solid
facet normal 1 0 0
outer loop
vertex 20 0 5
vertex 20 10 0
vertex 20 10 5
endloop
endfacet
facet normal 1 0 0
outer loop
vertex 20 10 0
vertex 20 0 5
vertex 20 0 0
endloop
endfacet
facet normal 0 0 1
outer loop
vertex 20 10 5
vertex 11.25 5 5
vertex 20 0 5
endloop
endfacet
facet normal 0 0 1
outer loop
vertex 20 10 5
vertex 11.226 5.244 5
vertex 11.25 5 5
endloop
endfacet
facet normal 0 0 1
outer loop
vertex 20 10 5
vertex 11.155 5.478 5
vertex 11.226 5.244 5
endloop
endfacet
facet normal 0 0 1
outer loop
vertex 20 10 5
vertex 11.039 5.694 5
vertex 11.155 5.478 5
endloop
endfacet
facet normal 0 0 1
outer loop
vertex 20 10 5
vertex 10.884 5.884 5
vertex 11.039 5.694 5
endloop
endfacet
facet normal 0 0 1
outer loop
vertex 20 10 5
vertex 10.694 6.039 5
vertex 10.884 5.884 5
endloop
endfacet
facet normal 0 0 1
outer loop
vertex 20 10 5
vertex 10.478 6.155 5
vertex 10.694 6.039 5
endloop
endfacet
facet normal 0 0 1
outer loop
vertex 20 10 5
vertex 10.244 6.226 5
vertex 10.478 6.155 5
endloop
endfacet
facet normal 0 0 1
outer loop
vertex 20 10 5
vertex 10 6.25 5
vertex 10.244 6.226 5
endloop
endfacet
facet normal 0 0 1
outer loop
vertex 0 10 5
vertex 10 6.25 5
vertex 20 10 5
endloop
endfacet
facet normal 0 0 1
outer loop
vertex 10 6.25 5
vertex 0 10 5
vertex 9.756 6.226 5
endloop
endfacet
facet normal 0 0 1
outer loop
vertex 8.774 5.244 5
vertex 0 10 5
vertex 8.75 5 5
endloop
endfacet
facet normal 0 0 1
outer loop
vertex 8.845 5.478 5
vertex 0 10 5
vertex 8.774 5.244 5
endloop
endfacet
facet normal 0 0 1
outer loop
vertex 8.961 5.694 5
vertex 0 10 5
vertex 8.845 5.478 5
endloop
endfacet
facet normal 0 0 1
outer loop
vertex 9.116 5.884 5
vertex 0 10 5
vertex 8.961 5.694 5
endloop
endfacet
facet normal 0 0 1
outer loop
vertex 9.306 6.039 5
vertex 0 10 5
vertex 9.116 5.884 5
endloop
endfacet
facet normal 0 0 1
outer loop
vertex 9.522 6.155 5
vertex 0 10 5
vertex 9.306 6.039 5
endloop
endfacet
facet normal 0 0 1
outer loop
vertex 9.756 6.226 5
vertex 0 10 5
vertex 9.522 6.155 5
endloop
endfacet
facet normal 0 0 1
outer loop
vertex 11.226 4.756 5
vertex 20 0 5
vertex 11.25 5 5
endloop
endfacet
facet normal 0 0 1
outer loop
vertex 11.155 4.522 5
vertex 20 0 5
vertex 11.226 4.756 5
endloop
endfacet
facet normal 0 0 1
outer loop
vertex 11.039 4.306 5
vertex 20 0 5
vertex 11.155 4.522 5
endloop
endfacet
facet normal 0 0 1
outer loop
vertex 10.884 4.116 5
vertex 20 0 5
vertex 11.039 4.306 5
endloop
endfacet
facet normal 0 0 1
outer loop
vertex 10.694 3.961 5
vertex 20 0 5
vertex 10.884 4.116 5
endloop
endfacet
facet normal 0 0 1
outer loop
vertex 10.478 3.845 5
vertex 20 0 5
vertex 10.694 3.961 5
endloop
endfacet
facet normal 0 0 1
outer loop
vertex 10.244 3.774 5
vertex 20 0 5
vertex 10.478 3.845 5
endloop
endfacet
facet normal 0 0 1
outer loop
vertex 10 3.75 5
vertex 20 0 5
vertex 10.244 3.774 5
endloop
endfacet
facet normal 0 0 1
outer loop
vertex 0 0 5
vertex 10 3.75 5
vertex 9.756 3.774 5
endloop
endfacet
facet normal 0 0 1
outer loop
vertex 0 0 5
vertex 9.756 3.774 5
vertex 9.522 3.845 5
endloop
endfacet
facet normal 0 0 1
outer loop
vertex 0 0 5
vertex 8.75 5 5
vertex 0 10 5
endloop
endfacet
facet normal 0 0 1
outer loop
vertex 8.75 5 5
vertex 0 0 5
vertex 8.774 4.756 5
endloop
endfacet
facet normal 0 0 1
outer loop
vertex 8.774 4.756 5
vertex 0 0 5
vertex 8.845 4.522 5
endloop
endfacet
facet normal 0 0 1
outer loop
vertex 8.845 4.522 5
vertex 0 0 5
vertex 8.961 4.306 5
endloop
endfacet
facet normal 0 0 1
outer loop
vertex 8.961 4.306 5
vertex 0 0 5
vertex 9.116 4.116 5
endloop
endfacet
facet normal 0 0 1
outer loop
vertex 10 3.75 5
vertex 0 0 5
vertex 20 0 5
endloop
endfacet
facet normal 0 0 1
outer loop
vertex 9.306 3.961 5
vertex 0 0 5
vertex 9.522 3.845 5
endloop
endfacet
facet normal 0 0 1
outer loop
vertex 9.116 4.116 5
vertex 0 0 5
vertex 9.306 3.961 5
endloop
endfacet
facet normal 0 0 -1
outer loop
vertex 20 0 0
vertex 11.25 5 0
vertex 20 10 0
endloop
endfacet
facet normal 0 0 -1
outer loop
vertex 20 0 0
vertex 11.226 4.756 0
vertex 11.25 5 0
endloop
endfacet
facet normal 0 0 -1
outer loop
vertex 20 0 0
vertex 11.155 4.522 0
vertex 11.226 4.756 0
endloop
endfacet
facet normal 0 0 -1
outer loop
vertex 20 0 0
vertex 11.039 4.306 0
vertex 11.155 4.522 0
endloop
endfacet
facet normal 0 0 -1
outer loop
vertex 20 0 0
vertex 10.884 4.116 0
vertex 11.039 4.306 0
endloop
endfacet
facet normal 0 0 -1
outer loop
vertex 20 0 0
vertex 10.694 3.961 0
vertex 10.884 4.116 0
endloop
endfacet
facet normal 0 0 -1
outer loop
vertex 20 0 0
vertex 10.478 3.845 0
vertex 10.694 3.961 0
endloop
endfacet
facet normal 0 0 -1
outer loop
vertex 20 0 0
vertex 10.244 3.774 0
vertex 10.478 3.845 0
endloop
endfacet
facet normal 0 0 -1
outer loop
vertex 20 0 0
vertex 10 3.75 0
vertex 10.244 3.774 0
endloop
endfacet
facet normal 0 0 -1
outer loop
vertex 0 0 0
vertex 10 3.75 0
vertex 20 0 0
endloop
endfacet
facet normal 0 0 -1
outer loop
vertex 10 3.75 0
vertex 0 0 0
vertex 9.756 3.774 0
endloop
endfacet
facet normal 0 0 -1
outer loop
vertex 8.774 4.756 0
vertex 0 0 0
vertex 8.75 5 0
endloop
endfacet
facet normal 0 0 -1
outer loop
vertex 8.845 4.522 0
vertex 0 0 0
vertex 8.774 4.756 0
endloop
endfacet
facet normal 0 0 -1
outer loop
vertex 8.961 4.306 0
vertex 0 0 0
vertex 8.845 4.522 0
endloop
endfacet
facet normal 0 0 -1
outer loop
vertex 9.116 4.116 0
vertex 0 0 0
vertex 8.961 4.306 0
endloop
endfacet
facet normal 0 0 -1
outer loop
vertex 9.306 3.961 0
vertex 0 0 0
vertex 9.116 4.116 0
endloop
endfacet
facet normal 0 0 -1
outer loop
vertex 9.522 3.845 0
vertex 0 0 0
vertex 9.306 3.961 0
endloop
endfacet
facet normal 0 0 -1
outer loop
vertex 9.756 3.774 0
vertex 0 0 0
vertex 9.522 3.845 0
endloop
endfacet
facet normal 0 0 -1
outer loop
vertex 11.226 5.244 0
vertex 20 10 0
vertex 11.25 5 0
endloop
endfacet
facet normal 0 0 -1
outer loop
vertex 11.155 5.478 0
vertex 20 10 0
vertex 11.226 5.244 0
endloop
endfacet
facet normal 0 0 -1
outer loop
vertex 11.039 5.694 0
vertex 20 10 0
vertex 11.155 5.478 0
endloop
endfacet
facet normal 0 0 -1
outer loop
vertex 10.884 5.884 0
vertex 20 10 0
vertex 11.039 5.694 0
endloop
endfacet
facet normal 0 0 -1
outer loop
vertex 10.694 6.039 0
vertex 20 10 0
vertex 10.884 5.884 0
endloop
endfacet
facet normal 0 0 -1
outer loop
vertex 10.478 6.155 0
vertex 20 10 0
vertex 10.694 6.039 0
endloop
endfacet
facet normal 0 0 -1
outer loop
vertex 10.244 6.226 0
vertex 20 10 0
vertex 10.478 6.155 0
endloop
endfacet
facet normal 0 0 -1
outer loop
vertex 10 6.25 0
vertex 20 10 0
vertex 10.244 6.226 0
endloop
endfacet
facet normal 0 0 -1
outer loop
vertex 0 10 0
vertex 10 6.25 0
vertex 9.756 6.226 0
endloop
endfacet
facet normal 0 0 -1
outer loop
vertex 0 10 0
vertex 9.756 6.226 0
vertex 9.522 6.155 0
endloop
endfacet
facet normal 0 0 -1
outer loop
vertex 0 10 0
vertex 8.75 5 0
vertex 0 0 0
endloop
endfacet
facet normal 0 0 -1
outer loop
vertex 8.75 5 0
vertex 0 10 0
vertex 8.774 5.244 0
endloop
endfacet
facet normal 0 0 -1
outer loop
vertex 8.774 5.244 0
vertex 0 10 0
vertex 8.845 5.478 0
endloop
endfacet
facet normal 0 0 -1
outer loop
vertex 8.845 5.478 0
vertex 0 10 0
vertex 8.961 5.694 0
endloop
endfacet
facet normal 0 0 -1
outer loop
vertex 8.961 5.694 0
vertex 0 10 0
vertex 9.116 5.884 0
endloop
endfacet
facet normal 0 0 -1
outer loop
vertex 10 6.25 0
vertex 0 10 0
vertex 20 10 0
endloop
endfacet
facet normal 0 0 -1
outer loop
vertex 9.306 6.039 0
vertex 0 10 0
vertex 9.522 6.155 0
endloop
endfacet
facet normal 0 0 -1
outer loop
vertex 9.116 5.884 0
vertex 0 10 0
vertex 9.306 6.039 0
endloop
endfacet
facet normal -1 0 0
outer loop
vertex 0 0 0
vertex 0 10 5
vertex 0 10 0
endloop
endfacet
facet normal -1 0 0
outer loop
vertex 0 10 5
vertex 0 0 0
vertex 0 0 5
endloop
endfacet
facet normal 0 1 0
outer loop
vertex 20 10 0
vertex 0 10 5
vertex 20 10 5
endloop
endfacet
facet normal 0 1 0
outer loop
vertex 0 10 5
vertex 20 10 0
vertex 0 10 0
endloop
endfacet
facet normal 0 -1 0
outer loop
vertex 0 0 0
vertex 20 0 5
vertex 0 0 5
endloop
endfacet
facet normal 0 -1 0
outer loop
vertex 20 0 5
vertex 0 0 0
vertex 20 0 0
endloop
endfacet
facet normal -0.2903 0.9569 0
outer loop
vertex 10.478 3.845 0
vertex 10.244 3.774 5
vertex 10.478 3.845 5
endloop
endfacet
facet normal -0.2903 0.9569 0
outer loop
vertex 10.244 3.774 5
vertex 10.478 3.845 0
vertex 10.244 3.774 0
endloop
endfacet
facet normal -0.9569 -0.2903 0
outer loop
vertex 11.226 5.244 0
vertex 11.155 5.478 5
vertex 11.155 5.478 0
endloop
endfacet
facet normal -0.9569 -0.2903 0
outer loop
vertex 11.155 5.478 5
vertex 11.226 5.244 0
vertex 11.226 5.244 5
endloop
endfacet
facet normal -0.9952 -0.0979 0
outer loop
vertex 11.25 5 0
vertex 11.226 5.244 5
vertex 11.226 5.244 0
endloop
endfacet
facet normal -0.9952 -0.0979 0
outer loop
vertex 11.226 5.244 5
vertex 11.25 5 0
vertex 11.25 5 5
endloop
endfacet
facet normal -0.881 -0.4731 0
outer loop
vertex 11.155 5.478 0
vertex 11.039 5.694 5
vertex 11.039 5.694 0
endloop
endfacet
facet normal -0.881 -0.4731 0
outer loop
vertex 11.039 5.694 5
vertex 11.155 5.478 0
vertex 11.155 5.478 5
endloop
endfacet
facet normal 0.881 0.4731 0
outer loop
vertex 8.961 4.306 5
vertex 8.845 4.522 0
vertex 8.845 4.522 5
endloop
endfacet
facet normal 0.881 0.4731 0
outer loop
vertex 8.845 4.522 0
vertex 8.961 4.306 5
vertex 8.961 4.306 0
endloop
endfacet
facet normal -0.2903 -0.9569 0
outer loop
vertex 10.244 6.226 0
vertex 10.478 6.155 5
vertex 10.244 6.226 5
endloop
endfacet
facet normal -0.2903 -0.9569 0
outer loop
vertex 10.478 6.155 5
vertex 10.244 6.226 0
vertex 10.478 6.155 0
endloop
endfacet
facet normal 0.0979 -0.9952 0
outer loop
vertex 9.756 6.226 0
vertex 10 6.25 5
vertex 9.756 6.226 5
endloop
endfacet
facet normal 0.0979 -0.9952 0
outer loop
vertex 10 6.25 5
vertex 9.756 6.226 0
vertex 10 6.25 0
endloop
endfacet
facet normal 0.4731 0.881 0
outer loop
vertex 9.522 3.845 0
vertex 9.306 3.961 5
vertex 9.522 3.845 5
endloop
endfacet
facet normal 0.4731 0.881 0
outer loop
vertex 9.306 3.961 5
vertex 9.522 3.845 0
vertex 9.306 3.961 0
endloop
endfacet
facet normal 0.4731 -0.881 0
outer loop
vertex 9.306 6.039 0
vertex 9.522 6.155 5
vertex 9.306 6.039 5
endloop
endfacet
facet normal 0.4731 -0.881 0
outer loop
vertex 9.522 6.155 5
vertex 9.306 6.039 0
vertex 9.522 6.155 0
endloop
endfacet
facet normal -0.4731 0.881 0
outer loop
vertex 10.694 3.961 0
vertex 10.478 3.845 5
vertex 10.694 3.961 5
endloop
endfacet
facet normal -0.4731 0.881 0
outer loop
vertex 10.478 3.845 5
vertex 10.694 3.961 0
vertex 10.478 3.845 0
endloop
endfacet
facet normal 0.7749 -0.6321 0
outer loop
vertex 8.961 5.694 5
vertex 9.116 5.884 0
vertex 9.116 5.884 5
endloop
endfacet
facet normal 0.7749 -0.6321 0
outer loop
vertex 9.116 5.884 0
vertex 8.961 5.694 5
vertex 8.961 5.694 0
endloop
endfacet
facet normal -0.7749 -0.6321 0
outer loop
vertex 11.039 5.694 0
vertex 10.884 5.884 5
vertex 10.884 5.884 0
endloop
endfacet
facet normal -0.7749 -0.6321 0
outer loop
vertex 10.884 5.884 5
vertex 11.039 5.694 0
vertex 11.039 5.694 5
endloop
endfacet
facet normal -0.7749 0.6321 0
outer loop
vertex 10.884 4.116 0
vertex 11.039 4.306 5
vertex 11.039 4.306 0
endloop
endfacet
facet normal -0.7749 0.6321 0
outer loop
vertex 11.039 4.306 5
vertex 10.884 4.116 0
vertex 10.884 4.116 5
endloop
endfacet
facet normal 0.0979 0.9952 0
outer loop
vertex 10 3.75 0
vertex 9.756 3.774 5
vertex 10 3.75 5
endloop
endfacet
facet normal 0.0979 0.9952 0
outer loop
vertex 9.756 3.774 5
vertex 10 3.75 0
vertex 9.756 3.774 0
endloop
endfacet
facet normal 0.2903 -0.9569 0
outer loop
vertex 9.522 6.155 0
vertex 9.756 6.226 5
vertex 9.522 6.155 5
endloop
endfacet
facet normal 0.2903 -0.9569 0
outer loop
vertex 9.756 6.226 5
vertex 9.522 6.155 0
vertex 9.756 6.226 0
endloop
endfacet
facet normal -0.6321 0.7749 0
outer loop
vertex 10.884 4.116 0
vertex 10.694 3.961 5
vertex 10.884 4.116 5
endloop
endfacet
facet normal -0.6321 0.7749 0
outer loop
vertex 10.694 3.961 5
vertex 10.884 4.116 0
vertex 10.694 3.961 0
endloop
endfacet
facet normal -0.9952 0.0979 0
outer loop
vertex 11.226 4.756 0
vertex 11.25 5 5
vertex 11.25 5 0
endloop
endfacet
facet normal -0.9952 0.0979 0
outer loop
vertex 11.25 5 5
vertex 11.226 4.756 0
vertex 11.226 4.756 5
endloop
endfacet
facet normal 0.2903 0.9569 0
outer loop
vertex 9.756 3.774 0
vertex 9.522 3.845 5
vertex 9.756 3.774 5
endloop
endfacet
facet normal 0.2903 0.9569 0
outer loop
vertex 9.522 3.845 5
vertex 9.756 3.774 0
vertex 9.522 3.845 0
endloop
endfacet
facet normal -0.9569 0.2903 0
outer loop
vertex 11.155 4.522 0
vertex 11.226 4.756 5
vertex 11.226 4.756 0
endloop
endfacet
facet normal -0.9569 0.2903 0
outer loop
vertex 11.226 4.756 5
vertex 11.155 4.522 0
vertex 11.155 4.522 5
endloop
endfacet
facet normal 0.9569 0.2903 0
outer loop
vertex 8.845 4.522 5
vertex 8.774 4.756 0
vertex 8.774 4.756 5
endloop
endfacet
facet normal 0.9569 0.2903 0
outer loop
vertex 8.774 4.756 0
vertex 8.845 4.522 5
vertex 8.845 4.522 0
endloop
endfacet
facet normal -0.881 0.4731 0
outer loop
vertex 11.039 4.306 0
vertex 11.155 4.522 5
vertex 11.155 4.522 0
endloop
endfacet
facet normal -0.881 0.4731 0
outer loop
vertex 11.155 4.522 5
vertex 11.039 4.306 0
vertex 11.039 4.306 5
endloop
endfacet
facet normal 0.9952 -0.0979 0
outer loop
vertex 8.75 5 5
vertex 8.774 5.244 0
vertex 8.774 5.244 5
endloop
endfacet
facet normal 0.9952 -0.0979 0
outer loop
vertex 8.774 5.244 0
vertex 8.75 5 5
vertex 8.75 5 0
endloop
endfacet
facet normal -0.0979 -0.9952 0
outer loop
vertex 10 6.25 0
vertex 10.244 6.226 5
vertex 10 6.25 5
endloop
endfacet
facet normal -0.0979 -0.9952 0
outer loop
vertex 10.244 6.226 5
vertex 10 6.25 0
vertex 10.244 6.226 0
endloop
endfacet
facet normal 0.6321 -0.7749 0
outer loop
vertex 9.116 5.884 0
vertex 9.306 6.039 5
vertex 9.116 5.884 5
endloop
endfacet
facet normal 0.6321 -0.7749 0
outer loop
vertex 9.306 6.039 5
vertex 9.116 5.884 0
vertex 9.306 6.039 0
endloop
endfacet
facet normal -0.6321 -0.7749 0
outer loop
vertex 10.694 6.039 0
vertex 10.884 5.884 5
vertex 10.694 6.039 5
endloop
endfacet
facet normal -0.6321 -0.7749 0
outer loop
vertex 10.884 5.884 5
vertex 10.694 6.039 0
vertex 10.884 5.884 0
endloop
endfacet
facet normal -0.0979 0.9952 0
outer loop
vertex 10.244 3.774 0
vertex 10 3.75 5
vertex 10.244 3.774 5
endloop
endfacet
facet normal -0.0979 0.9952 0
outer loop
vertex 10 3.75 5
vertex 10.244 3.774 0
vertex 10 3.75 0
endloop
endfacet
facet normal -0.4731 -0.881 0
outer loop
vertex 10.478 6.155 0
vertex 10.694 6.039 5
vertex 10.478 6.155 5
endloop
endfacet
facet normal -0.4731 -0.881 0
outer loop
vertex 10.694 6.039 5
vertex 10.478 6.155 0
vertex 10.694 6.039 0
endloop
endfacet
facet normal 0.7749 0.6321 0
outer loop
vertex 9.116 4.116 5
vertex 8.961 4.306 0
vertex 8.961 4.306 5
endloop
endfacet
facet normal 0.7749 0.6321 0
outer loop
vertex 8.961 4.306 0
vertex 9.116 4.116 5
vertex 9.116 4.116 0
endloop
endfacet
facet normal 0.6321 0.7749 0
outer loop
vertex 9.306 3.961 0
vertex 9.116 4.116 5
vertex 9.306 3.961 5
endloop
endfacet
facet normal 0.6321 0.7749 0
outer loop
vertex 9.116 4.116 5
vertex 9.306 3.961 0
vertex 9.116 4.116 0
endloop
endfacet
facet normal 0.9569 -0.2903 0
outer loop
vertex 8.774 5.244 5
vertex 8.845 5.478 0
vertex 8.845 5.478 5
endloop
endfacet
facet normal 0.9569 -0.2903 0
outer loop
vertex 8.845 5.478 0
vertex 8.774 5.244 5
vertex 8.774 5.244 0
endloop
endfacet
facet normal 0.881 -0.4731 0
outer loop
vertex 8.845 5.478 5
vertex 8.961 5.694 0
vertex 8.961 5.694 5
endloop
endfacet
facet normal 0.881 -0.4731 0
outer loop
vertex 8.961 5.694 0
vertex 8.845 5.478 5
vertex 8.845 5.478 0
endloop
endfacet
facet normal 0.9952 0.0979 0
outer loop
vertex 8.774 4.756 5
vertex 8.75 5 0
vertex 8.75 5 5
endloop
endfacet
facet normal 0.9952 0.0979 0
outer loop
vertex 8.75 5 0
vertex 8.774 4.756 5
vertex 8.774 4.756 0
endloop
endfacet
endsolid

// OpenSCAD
$fn = 32;

// ----------------------------------------------------------------------
// Micro pad: drilled pad, 5-20 mm class
// ----------------------------------------------------------------------

// --- parameters (mm) ---
pad_l = 20;               // pad length, X
pad_w = 10;               // pad width, Y
pad_t = 5;                // pad thickness, Z
hole_d = 2.5;             // through hole diameter

difference() {
  cube([pad_l, pad_w, pad_t]);
  translate([pad_l / 2, pad_w / 2, -1])
    cylinder(h = pad_t + 2, d = hole_d);
}
